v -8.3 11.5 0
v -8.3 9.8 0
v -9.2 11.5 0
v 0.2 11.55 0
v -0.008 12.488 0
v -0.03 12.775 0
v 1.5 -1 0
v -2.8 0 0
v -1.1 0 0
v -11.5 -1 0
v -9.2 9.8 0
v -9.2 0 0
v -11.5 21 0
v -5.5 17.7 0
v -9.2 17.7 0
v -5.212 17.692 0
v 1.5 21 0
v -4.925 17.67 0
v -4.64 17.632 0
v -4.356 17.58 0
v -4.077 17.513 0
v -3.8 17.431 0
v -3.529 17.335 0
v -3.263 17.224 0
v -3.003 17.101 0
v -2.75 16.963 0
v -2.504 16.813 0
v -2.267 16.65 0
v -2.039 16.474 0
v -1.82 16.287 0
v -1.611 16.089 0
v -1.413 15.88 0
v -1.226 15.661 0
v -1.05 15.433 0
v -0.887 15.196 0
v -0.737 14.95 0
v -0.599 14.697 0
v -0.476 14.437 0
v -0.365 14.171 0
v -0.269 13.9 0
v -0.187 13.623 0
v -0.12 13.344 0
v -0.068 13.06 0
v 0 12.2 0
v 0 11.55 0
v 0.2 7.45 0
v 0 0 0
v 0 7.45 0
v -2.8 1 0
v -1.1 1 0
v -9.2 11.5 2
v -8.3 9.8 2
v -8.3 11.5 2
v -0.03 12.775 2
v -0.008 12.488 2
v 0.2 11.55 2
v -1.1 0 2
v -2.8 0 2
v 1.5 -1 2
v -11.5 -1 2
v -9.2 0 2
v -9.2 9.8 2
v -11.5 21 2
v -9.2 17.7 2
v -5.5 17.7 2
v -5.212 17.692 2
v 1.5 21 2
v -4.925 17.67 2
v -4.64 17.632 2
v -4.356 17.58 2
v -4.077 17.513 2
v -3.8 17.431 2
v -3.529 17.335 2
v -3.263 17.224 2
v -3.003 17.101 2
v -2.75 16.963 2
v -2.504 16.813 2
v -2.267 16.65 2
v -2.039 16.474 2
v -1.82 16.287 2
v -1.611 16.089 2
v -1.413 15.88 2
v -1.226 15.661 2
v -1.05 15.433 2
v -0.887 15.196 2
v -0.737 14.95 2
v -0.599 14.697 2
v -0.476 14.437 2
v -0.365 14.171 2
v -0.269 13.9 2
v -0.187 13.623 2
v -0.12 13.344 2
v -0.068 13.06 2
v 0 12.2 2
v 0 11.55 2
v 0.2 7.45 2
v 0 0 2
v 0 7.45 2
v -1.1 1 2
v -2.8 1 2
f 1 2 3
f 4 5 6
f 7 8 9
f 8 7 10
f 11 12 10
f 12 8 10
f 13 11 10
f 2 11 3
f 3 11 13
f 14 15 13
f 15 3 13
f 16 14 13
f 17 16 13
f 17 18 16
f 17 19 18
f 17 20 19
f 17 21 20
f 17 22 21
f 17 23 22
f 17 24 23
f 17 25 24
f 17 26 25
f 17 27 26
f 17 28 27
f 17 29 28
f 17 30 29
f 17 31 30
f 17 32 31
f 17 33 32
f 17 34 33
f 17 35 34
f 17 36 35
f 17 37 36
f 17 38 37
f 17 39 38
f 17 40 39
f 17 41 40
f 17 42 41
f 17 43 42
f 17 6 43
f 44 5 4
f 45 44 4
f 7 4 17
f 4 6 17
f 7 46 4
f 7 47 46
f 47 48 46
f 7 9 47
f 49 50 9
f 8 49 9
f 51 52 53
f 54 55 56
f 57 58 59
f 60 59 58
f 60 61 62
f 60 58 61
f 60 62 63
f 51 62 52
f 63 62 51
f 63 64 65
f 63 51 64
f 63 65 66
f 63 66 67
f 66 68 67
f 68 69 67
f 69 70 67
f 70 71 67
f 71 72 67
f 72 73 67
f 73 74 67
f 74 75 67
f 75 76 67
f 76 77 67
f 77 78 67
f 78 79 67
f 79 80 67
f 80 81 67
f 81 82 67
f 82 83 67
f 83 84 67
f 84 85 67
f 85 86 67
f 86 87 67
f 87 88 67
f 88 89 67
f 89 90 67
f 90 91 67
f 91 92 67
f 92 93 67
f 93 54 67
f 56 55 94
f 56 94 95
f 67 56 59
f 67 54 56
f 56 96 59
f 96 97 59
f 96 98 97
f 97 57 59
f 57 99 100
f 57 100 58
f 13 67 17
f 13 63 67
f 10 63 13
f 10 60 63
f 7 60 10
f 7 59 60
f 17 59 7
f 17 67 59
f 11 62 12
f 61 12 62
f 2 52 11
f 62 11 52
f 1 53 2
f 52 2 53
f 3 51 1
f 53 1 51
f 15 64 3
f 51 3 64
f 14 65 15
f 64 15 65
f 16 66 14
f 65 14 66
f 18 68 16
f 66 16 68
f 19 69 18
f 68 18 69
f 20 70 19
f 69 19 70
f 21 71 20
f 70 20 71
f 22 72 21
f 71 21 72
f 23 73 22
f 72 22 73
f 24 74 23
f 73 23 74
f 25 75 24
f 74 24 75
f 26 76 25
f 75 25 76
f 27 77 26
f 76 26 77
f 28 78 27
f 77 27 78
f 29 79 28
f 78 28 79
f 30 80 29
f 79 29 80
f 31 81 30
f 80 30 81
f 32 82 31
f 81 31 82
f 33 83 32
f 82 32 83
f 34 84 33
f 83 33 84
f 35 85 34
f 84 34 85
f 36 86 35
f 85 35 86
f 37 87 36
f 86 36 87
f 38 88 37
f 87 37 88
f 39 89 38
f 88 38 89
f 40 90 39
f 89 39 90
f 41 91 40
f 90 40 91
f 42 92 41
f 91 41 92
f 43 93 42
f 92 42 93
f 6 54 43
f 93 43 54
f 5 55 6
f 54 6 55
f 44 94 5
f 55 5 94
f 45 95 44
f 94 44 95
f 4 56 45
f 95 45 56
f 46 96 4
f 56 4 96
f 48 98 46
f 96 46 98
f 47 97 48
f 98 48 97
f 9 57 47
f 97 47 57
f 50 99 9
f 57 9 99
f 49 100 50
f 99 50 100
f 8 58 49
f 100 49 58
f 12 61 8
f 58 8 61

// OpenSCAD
depth=20;
vial_width=23.08;
module vial(height=depth) {
    cylinder(h=height, d=vial_width);
}
module vial_holes() {
    for(x=[0,1,2]) {
        translate([x * (vial_width+2), 0, 0]) vial();
    }
    translate([0,vial_width + 2, 0]) {
        for(x=[0,1]) {
            translate([x * (vial_width+2), 0, 0]) vial();
        }
    }
}

module cartridge_hole() {
    translate([0, 17.7, 0]) mirror([0,1,0]) rotate([0,0,90]) {
        union() {
            difference() {
                square([17.7, 9.2]);
                translate([5.5, 5.5, 0]) rotate([0,0,180]) {
                    difference() {
                        square(5.5);
                        circle(r=5.5, $fn=120);
                    }
                }
                translate([6.2, 8.9 - 1.8+1.2, ,0]) square(1.7);
                translate([17.2-1.8+1.3, 1.1, 0]) square(1.7);
            }
            translate([6.15, -0.2, 0]) square([4.1, 0.2]);
        }
    }

}

module test_cartridge_hole(height=2) {
    linear_extrude(height=height) difference() {
        translate([-13 + 1.5, -height/2]) square([13, 22]);
        cartridge_hole();
    }
}

module test_vial_hole(height=2) {
    difference() {
        cube([vial_width +4, vial_width + 4, height], center=true);
        // punch through for hole tests.
        translate([0,0, -depth/2]) vial();
    }
}

module holes() {
    vial_holes();
    translate([2*(vial_width +2) -1, vial_width - 17.2/2 + 1,0]) linear_extrude(height=depth) 
        cartridge_hole();
    translate([2*(vial_width +2)+10, vial_width - 17.2/2 + 1,0]) linear_extrude(height=depth)
        cartridge_hole();
}
// 11.5 - 7.5
// 9.18
//$fn=120;
$fa=2;
$fs=0.05;
module main() {
    difference() {
        minkowski() {
            translate([-vial_width/2 - 3, -vial_width/2 -3, -2]) 
                cube([3 * (vial_width+2) + 3, 2 * vial_width +4 + 3, depth]);
            sphere(r=1);
        }
        holes();
    }
}
module test() {
    translate([20, 0,0]) test_vial_hole();
    translate([-20, 0,0]) test_cartridge();
}
//test();
//cartridge_hole();
test_cartridge_hole();
//main();
    
